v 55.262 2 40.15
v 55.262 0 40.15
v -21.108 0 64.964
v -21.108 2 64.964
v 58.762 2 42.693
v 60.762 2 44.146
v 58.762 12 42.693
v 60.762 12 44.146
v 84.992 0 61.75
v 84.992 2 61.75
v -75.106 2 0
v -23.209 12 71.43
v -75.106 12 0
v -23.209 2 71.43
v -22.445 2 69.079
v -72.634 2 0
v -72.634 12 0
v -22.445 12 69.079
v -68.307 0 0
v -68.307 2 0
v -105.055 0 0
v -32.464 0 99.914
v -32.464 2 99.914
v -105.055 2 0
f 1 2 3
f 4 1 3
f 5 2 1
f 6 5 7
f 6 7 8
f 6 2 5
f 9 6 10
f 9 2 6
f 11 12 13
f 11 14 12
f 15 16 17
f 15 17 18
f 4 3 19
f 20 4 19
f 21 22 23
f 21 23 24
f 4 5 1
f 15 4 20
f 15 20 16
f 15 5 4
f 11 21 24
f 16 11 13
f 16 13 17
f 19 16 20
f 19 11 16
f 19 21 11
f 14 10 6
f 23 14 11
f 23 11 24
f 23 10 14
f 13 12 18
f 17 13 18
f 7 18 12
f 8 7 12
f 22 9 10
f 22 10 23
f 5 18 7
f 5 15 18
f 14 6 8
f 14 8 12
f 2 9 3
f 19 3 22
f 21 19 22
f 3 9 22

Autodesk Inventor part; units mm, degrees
ref_plane "YZ Plane" through (0, 0, 0) normal (1, 0, 0) x (0, 1, 0)
ref_plane "XZ Plane" through (0, 0, 0) normal (0, 1, 0) x (-1, 0, 0)
ref_plane "XY Plane" through (0, 0, 0) normal (0, 0, 1) x (1, 0, 0)
sketch "草图1" plane through (0, 0, 0) normal (0, 1, 0) x (-1, 0, 0)
  line L0 (68.3073, 0) -> (21.1081, -64.9641)
  line L1 (21.1081, -64.9641) -> (-55.2617, -40.15)
  line L2 (-55.2617, -40.15) -> (-55.2617, 40.15)
  line L3 (-55.2617, 40.15) -> (21.1081, 64.9641)
  line L4 (21.1081, 64.9641) -> (68.3073, 0)
  line L5 (105.0554, 0) -> (32.4639, -99.9136)
  line L6 (32.4639, -99.9136) -> (-84.9916, -61.75)
  line L7 (-84.9916, -61.75) -> (-84.9916, 61.75)
  line L8 (-84.9916, 61.75) -> (32.4639, 99.9136)
  line L9 (32.4639, 99.9136) -> (105.0554, 0)
  point P0 (0, 0)
  point P1 (0, 0)
  point P2 (0, 0)
  dimension "d0" = 80.3
  dimension "d1" = 123.5
extrude "拉伸1" add sketch "草图1" along normal blind 2
sketch "草图2" plane through (0, 2, 0) normal (0, 1, 0) x (1, 0, 0)
  line L0 (-21.1081, 64.9641) -> (55.2617, 40.15) projected
  line L1 (55.2617, 40.15) -> (55.2617, -40.15) projected
  line L2 (55.2617, -40.15) -> (-21.1081, -64.9641) projected
  line L3 (-21.1081, -64.9641) -> (-68.3073, 0) projected
  line L4 (-68.3073, 0) -> (-21.1081, 64.9641) projected
  line L5 (-32.4639, 99.9136) -> (-105.0554, 0) projected
  line L6 (-105.0554, 0) -> (-32.4639, -99.9136) projected
  line L7 (-32.4639, -99.9136) -> (84.9916, -61.75) projected
  line L8 (84.9916, -61.75) -> (84.9916, 61.75) projected
  line L9 (84.9916, 61.75) -> (-32.4639, 99.9136) projected
  line L10 (58.7617, 42.6929) -> (-22.445, 69.0786)
  line L11 (-22.445, 69.0786) -> (-72.6335, 0)
  line L12 (-72.6335, 0) -> (-22.445, -69.0786)
  line L13 (-22.445, -69.0786) -> (58.7617, -42.6929)
  line L14 (58.7617, -42.6929) -> (58.7617, 42.6929)
  line L15 (-23.2089, 71.4297) -> (60.7617, 44.146)
  line L16 (60.7617, 44.146) -> (60.7617, -44.146)
  line L17 (60.7617, -44.146) -> (-23.2089, -71.4297)
  line L18 (-23.2089, -71.4297) -> (-75.1056, 0)
  line L19 (-75.1056, 0) -> (-23.2089, 71.4297)
  point P0 (0, 0)
  dimension "d4" = 3.5
  dimension "d5" = 2
extrude "拉伸2" add sketch "草图2" along normal blind 10 contours L15 L16 L17 L18 L19
sketch "草图3" plane through (0, 0, 0) normal (0, -1, 0) x (1, 0, 0)
  line L0 (-9.4145, -72.1274) -> (53.3776, -50.8644)
  line L1 (53.3776, -50.8644) -> (57.7542, -63.7889)
  line L2 (57.7542, -63.7889) -> (-5.038, -85.0518)
  line L3 (-5.038, -85.0518) -> (-9.4145, -72.1274)
  point P0 (0, 0)
extrude "拉伸3" cut sketch "草图3" against normal blind 10
sketch "草图4" plane through (0, 0, 0) normal (0, -1, 0) x (1, 0, 0)
  line L0 (-105.0554, 0) -> (-32.4639, -99.9136) projected
  line L1 (-105.0554, 0) -> (0, 0)
  line L2 (0, 0) -> (99.3977, 72.2167)
  line L3 (99.3977, 72.2167) -> (-62.0091, 125.592)
  line L4 (-62.0091, 125.592) -> (-127.7953, 9.1282)
  line L5 (-127.7953, 9.1282) -> (-105.0554, 0)
extrude "拉伸4" cut sketch "草图4" against normal blind 16.75 keep common part
properties part number "上部端盖" material "橡胶"
